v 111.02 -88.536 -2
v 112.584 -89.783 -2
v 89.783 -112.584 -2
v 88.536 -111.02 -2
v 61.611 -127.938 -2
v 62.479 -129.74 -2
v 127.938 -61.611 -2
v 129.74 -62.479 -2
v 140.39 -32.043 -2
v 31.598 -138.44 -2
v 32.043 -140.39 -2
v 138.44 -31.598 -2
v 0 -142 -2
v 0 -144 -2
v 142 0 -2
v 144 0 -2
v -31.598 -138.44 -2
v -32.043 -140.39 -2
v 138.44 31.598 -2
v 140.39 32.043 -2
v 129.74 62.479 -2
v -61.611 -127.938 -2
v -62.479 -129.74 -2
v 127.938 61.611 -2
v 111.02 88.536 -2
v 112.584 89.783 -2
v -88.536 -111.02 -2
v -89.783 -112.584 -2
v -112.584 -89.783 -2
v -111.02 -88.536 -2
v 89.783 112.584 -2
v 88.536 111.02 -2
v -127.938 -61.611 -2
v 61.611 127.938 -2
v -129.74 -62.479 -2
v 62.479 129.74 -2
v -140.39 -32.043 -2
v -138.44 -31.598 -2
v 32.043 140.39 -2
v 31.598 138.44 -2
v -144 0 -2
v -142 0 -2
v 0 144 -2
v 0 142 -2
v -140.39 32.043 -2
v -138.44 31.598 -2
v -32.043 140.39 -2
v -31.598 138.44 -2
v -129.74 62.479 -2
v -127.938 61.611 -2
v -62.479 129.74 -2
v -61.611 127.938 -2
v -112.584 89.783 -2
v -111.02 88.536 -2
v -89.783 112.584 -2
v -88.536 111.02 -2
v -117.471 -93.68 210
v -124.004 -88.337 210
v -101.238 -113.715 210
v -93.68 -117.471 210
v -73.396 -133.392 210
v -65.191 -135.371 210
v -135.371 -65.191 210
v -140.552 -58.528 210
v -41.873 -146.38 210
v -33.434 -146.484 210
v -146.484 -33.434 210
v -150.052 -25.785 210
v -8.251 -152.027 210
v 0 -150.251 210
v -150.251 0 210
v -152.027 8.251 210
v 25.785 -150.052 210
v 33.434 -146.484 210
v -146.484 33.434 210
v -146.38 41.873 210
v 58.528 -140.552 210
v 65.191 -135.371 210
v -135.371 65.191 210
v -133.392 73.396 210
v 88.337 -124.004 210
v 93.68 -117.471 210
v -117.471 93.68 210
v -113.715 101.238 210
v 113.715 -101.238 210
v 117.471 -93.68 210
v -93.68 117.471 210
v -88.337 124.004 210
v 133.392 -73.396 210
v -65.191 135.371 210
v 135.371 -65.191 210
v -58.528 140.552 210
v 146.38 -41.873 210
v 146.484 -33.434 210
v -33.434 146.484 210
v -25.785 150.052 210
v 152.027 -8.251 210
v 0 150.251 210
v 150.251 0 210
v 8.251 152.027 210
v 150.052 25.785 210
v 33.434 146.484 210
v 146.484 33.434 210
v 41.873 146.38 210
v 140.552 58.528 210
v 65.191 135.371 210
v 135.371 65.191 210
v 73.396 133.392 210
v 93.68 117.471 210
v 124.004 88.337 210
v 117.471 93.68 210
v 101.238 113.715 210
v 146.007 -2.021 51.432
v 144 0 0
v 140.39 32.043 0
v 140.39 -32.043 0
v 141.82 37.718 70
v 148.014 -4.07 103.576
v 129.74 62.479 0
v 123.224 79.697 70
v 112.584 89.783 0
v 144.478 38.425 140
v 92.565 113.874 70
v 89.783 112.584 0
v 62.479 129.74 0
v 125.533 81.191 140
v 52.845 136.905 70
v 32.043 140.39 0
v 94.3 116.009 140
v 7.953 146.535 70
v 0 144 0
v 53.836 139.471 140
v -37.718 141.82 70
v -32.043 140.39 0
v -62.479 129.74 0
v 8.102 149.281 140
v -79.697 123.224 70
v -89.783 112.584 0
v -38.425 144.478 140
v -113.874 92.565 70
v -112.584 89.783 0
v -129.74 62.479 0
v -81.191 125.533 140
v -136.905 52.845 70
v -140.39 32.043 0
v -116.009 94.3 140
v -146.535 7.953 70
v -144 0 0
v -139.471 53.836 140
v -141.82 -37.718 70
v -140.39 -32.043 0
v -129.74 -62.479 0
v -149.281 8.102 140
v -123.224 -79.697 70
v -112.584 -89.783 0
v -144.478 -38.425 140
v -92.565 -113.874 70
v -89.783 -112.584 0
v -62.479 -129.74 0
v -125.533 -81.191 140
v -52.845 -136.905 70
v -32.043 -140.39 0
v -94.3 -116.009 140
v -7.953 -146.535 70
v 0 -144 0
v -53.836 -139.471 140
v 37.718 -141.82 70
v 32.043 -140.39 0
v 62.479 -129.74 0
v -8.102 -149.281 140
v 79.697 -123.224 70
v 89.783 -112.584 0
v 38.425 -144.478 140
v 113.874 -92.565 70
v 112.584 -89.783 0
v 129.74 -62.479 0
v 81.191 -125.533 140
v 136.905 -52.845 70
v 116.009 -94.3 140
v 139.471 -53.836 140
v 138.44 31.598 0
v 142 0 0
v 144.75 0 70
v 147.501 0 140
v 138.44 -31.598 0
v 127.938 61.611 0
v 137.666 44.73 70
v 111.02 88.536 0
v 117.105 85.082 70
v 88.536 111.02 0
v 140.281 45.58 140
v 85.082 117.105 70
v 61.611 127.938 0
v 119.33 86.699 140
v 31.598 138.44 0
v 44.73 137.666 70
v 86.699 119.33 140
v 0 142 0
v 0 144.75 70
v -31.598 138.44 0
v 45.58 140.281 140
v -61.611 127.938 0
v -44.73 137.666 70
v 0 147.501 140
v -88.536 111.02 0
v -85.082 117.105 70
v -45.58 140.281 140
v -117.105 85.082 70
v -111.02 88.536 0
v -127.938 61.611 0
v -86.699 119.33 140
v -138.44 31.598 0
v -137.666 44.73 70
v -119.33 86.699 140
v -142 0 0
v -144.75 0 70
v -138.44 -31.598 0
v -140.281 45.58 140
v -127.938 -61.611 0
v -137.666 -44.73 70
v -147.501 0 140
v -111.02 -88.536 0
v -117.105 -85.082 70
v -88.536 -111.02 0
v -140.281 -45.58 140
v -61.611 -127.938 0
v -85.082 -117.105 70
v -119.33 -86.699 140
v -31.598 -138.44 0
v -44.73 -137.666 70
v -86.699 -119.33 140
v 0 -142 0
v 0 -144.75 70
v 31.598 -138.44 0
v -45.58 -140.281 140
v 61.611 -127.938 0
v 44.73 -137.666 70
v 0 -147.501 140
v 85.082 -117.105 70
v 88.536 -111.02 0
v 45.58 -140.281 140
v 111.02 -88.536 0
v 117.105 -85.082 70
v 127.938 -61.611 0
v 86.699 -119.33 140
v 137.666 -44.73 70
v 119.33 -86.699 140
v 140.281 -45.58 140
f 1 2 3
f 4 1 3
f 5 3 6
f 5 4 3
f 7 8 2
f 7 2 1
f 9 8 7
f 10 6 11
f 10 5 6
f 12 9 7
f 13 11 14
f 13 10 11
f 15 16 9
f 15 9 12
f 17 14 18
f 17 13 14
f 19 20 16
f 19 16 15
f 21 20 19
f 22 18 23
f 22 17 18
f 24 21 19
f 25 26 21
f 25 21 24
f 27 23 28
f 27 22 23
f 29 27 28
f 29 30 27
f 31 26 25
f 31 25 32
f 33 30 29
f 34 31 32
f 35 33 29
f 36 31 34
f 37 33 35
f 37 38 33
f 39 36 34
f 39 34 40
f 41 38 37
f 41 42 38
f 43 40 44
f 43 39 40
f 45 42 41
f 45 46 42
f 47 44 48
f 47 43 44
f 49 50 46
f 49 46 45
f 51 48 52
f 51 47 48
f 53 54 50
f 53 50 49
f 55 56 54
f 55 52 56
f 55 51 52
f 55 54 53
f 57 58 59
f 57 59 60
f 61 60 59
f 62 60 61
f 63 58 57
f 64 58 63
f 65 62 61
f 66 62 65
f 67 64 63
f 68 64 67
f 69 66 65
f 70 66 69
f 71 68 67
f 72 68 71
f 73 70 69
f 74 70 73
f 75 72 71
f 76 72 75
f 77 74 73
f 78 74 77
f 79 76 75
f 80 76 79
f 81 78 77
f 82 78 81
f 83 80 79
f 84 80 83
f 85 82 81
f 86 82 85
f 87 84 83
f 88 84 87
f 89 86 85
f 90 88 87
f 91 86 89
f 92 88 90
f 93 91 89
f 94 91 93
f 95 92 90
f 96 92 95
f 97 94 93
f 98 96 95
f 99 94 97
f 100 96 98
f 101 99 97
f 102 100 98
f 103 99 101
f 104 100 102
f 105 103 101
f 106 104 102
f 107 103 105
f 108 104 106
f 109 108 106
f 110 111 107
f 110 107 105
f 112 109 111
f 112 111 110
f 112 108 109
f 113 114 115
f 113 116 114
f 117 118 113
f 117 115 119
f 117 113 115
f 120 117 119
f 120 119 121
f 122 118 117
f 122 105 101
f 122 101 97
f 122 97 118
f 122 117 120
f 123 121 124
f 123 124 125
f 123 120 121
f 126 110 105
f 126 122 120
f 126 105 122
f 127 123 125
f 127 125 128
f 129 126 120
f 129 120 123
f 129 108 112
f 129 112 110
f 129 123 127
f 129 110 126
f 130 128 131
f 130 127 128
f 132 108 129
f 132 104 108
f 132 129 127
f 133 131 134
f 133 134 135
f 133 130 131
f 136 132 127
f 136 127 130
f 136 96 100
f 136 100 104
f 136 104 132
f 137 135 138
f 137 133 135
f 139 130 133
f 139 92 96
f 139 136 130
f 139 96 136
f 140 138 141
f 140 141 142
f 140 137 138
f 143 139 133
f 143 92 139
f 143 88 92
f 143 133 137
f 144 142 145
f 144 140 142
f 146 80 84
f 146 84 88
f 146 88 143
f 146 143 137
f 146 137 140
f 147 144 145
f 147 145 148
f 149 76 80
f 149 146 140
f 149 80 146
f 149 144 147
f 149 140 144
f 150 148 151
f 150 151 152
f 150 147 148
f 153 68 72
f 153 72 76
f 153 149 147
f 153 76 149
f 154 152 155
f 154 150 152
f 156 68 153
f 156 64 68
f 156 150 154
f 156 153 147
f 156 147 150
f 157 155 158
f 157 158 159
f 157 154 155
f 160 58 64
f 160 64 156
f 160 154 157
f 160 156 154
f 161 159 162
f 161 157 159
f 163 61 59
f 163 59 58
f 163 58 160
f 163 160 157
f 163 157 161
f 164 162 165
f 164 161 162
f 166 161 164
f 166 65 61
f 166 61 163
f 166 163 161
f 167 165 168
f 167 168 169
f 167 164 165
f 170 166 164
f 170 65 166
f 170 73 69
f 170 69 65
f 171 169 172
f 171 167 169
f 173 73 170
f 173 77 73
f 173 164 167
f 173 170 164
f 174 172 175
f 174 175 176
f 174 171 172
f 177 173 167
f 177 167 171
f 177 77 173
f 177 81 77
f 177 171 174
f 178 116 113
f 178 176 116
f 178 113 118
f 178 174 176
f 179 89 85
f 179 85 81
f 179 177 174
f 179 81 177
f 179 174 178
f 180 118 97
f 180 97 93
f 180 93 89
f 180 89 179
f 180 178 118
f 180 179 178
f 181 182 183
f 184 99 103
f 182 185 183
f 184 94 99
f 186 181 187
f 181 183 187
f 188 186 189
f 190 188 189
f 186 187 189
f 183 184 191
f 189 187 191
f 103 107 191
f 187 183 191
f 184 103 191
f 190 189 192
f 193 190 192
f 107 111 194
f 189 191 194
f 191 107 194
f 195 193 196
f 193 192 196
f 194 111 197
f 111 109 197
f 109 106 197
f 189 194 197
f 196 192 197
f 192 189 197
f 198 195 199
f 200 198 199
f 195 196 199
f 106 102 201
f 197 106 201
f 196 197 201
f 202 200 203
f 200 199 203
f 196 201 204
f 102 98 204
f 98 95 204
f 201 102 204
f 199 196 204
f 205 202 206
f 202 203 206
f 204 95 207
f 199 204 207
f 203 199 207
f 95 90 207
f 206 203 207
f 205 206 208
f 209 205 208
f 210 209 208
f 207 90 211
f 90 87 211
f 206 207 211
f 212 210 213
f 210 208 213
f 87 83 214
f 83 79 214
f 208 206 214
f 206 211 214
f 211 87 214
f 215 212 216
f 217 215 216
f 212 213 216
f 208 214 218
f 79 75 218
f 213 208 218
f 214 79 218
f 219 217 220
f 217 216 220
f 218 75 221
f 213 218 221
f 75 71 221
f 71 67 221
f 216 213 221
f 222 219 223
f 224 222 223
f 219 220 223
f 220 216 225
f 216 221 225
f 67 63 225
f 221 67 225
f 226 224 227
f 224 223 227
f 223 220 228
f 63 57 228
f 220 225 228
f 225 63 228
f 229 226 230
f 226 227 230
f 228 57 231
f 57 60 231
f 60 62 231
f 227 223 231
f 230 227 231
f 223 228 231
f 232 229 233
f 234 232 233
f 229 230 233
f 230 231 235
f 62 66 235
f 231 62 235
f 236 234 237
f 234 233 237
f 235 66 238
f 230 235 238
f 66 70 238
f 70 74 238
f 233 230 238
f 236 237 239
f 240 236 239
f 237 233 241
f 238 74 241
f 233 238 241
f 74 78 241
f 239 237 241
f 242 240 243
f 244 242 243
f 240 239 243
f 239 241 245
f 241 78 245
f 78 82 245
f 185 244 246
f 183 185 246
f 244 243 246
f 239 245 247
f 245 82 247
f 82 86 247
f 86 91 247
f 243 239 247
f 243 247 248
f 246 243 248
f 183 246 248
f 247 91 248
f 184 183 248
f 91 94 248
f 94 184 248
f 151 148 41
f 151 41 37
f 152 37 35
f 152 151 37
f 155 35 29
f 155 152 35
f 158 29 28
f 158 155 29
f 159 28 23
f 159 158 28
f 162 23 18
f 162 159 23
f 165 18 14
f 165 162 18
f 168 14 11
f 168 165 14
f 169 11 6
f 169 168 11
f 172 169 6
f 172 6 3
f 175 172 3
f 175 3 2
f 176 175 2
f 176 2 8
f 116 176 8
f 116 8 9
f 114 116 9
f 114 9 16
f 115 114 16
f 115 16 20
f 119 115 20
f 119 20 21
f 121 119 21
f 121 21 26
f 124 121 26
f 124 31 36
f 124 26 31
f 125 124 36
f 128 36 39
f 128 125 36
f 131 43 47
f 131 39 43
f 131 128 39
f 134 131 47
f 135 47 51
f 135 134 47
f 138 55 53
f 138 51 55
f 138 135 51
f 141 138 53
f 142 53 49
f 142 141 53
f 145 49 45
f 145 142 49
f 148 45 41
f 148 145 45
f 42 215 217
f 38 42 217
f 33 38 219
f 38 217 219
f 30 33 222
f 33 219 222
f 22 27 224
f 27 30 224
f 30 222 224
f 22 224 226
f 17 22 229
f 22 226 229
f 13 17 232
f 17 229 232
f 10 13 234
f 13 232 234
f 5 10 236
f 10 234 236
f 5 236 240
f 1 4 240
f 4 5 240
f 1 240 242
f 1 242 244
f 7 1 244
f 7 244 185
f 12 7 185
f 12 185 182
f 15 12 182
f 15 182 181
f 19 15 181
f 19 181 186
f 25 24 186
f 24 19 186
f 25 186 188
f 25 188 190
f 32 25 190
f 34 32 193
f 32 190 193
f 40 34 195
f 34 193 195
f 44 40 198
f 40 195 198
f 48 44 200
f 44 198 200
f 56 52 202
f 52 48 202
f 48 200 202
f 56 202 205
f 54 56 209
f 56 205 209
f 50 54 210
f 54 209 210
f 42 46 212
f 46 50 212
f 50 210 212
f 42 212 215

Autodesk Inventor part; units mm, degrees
ref_plane "YZ Plane" through (0, 0, 0) normal (1, 0, 0) x (0, 1, 0)
ref_plane "XZ Plane" through (0, 0, 0) normal (0, 1, 0) x (-1, 0, 0)
ref_plane "XY Plane" through (0, 0, 0) normal (0, 0, 1) x (1, 0, 0)
sketch "Skizze3" plane through (0, 0, 0) normal (0, 0, 1) x (1, 0, 0)
  line L0 (-201.6, 0) -> (201.6, 0) projected
  line L1 (0, -201.6) -> (0, 201.6) projected
  circle A0 centre (0, 0) radius 144
  dimension "d4" = 288
extrude "Extrusion2" add sketch "Skizze3" along normal blind 210 draft 2.25
sketch "Skizze4" plane through (0, 0, 210) normal (0, 0, 1) x (1, 0, 0)
  circle A0 centre (0, 0) radius 150.2509
  circle A1 centre (0, 0) radius 152.2509 projected
  dimension "d7" = 2
extrude "Extrusion3" cut sketch "Skizze4" against normal blind 210 draft -2.25 contours A0
sketch "Skizze5" plane through (0, 0, 0) normal (0, 0, -1) x (-1, 0, 0)
  circle A0 centre (0, 0) radius 144 projected
  circle A1 centre (0, 0) radius 144
  circle A2 centre (0, 0) radius 142
extrude "Extrusion4" add sketch "Skizze5" along normal blind 2
properties part number "Abdeckungsrohr"
